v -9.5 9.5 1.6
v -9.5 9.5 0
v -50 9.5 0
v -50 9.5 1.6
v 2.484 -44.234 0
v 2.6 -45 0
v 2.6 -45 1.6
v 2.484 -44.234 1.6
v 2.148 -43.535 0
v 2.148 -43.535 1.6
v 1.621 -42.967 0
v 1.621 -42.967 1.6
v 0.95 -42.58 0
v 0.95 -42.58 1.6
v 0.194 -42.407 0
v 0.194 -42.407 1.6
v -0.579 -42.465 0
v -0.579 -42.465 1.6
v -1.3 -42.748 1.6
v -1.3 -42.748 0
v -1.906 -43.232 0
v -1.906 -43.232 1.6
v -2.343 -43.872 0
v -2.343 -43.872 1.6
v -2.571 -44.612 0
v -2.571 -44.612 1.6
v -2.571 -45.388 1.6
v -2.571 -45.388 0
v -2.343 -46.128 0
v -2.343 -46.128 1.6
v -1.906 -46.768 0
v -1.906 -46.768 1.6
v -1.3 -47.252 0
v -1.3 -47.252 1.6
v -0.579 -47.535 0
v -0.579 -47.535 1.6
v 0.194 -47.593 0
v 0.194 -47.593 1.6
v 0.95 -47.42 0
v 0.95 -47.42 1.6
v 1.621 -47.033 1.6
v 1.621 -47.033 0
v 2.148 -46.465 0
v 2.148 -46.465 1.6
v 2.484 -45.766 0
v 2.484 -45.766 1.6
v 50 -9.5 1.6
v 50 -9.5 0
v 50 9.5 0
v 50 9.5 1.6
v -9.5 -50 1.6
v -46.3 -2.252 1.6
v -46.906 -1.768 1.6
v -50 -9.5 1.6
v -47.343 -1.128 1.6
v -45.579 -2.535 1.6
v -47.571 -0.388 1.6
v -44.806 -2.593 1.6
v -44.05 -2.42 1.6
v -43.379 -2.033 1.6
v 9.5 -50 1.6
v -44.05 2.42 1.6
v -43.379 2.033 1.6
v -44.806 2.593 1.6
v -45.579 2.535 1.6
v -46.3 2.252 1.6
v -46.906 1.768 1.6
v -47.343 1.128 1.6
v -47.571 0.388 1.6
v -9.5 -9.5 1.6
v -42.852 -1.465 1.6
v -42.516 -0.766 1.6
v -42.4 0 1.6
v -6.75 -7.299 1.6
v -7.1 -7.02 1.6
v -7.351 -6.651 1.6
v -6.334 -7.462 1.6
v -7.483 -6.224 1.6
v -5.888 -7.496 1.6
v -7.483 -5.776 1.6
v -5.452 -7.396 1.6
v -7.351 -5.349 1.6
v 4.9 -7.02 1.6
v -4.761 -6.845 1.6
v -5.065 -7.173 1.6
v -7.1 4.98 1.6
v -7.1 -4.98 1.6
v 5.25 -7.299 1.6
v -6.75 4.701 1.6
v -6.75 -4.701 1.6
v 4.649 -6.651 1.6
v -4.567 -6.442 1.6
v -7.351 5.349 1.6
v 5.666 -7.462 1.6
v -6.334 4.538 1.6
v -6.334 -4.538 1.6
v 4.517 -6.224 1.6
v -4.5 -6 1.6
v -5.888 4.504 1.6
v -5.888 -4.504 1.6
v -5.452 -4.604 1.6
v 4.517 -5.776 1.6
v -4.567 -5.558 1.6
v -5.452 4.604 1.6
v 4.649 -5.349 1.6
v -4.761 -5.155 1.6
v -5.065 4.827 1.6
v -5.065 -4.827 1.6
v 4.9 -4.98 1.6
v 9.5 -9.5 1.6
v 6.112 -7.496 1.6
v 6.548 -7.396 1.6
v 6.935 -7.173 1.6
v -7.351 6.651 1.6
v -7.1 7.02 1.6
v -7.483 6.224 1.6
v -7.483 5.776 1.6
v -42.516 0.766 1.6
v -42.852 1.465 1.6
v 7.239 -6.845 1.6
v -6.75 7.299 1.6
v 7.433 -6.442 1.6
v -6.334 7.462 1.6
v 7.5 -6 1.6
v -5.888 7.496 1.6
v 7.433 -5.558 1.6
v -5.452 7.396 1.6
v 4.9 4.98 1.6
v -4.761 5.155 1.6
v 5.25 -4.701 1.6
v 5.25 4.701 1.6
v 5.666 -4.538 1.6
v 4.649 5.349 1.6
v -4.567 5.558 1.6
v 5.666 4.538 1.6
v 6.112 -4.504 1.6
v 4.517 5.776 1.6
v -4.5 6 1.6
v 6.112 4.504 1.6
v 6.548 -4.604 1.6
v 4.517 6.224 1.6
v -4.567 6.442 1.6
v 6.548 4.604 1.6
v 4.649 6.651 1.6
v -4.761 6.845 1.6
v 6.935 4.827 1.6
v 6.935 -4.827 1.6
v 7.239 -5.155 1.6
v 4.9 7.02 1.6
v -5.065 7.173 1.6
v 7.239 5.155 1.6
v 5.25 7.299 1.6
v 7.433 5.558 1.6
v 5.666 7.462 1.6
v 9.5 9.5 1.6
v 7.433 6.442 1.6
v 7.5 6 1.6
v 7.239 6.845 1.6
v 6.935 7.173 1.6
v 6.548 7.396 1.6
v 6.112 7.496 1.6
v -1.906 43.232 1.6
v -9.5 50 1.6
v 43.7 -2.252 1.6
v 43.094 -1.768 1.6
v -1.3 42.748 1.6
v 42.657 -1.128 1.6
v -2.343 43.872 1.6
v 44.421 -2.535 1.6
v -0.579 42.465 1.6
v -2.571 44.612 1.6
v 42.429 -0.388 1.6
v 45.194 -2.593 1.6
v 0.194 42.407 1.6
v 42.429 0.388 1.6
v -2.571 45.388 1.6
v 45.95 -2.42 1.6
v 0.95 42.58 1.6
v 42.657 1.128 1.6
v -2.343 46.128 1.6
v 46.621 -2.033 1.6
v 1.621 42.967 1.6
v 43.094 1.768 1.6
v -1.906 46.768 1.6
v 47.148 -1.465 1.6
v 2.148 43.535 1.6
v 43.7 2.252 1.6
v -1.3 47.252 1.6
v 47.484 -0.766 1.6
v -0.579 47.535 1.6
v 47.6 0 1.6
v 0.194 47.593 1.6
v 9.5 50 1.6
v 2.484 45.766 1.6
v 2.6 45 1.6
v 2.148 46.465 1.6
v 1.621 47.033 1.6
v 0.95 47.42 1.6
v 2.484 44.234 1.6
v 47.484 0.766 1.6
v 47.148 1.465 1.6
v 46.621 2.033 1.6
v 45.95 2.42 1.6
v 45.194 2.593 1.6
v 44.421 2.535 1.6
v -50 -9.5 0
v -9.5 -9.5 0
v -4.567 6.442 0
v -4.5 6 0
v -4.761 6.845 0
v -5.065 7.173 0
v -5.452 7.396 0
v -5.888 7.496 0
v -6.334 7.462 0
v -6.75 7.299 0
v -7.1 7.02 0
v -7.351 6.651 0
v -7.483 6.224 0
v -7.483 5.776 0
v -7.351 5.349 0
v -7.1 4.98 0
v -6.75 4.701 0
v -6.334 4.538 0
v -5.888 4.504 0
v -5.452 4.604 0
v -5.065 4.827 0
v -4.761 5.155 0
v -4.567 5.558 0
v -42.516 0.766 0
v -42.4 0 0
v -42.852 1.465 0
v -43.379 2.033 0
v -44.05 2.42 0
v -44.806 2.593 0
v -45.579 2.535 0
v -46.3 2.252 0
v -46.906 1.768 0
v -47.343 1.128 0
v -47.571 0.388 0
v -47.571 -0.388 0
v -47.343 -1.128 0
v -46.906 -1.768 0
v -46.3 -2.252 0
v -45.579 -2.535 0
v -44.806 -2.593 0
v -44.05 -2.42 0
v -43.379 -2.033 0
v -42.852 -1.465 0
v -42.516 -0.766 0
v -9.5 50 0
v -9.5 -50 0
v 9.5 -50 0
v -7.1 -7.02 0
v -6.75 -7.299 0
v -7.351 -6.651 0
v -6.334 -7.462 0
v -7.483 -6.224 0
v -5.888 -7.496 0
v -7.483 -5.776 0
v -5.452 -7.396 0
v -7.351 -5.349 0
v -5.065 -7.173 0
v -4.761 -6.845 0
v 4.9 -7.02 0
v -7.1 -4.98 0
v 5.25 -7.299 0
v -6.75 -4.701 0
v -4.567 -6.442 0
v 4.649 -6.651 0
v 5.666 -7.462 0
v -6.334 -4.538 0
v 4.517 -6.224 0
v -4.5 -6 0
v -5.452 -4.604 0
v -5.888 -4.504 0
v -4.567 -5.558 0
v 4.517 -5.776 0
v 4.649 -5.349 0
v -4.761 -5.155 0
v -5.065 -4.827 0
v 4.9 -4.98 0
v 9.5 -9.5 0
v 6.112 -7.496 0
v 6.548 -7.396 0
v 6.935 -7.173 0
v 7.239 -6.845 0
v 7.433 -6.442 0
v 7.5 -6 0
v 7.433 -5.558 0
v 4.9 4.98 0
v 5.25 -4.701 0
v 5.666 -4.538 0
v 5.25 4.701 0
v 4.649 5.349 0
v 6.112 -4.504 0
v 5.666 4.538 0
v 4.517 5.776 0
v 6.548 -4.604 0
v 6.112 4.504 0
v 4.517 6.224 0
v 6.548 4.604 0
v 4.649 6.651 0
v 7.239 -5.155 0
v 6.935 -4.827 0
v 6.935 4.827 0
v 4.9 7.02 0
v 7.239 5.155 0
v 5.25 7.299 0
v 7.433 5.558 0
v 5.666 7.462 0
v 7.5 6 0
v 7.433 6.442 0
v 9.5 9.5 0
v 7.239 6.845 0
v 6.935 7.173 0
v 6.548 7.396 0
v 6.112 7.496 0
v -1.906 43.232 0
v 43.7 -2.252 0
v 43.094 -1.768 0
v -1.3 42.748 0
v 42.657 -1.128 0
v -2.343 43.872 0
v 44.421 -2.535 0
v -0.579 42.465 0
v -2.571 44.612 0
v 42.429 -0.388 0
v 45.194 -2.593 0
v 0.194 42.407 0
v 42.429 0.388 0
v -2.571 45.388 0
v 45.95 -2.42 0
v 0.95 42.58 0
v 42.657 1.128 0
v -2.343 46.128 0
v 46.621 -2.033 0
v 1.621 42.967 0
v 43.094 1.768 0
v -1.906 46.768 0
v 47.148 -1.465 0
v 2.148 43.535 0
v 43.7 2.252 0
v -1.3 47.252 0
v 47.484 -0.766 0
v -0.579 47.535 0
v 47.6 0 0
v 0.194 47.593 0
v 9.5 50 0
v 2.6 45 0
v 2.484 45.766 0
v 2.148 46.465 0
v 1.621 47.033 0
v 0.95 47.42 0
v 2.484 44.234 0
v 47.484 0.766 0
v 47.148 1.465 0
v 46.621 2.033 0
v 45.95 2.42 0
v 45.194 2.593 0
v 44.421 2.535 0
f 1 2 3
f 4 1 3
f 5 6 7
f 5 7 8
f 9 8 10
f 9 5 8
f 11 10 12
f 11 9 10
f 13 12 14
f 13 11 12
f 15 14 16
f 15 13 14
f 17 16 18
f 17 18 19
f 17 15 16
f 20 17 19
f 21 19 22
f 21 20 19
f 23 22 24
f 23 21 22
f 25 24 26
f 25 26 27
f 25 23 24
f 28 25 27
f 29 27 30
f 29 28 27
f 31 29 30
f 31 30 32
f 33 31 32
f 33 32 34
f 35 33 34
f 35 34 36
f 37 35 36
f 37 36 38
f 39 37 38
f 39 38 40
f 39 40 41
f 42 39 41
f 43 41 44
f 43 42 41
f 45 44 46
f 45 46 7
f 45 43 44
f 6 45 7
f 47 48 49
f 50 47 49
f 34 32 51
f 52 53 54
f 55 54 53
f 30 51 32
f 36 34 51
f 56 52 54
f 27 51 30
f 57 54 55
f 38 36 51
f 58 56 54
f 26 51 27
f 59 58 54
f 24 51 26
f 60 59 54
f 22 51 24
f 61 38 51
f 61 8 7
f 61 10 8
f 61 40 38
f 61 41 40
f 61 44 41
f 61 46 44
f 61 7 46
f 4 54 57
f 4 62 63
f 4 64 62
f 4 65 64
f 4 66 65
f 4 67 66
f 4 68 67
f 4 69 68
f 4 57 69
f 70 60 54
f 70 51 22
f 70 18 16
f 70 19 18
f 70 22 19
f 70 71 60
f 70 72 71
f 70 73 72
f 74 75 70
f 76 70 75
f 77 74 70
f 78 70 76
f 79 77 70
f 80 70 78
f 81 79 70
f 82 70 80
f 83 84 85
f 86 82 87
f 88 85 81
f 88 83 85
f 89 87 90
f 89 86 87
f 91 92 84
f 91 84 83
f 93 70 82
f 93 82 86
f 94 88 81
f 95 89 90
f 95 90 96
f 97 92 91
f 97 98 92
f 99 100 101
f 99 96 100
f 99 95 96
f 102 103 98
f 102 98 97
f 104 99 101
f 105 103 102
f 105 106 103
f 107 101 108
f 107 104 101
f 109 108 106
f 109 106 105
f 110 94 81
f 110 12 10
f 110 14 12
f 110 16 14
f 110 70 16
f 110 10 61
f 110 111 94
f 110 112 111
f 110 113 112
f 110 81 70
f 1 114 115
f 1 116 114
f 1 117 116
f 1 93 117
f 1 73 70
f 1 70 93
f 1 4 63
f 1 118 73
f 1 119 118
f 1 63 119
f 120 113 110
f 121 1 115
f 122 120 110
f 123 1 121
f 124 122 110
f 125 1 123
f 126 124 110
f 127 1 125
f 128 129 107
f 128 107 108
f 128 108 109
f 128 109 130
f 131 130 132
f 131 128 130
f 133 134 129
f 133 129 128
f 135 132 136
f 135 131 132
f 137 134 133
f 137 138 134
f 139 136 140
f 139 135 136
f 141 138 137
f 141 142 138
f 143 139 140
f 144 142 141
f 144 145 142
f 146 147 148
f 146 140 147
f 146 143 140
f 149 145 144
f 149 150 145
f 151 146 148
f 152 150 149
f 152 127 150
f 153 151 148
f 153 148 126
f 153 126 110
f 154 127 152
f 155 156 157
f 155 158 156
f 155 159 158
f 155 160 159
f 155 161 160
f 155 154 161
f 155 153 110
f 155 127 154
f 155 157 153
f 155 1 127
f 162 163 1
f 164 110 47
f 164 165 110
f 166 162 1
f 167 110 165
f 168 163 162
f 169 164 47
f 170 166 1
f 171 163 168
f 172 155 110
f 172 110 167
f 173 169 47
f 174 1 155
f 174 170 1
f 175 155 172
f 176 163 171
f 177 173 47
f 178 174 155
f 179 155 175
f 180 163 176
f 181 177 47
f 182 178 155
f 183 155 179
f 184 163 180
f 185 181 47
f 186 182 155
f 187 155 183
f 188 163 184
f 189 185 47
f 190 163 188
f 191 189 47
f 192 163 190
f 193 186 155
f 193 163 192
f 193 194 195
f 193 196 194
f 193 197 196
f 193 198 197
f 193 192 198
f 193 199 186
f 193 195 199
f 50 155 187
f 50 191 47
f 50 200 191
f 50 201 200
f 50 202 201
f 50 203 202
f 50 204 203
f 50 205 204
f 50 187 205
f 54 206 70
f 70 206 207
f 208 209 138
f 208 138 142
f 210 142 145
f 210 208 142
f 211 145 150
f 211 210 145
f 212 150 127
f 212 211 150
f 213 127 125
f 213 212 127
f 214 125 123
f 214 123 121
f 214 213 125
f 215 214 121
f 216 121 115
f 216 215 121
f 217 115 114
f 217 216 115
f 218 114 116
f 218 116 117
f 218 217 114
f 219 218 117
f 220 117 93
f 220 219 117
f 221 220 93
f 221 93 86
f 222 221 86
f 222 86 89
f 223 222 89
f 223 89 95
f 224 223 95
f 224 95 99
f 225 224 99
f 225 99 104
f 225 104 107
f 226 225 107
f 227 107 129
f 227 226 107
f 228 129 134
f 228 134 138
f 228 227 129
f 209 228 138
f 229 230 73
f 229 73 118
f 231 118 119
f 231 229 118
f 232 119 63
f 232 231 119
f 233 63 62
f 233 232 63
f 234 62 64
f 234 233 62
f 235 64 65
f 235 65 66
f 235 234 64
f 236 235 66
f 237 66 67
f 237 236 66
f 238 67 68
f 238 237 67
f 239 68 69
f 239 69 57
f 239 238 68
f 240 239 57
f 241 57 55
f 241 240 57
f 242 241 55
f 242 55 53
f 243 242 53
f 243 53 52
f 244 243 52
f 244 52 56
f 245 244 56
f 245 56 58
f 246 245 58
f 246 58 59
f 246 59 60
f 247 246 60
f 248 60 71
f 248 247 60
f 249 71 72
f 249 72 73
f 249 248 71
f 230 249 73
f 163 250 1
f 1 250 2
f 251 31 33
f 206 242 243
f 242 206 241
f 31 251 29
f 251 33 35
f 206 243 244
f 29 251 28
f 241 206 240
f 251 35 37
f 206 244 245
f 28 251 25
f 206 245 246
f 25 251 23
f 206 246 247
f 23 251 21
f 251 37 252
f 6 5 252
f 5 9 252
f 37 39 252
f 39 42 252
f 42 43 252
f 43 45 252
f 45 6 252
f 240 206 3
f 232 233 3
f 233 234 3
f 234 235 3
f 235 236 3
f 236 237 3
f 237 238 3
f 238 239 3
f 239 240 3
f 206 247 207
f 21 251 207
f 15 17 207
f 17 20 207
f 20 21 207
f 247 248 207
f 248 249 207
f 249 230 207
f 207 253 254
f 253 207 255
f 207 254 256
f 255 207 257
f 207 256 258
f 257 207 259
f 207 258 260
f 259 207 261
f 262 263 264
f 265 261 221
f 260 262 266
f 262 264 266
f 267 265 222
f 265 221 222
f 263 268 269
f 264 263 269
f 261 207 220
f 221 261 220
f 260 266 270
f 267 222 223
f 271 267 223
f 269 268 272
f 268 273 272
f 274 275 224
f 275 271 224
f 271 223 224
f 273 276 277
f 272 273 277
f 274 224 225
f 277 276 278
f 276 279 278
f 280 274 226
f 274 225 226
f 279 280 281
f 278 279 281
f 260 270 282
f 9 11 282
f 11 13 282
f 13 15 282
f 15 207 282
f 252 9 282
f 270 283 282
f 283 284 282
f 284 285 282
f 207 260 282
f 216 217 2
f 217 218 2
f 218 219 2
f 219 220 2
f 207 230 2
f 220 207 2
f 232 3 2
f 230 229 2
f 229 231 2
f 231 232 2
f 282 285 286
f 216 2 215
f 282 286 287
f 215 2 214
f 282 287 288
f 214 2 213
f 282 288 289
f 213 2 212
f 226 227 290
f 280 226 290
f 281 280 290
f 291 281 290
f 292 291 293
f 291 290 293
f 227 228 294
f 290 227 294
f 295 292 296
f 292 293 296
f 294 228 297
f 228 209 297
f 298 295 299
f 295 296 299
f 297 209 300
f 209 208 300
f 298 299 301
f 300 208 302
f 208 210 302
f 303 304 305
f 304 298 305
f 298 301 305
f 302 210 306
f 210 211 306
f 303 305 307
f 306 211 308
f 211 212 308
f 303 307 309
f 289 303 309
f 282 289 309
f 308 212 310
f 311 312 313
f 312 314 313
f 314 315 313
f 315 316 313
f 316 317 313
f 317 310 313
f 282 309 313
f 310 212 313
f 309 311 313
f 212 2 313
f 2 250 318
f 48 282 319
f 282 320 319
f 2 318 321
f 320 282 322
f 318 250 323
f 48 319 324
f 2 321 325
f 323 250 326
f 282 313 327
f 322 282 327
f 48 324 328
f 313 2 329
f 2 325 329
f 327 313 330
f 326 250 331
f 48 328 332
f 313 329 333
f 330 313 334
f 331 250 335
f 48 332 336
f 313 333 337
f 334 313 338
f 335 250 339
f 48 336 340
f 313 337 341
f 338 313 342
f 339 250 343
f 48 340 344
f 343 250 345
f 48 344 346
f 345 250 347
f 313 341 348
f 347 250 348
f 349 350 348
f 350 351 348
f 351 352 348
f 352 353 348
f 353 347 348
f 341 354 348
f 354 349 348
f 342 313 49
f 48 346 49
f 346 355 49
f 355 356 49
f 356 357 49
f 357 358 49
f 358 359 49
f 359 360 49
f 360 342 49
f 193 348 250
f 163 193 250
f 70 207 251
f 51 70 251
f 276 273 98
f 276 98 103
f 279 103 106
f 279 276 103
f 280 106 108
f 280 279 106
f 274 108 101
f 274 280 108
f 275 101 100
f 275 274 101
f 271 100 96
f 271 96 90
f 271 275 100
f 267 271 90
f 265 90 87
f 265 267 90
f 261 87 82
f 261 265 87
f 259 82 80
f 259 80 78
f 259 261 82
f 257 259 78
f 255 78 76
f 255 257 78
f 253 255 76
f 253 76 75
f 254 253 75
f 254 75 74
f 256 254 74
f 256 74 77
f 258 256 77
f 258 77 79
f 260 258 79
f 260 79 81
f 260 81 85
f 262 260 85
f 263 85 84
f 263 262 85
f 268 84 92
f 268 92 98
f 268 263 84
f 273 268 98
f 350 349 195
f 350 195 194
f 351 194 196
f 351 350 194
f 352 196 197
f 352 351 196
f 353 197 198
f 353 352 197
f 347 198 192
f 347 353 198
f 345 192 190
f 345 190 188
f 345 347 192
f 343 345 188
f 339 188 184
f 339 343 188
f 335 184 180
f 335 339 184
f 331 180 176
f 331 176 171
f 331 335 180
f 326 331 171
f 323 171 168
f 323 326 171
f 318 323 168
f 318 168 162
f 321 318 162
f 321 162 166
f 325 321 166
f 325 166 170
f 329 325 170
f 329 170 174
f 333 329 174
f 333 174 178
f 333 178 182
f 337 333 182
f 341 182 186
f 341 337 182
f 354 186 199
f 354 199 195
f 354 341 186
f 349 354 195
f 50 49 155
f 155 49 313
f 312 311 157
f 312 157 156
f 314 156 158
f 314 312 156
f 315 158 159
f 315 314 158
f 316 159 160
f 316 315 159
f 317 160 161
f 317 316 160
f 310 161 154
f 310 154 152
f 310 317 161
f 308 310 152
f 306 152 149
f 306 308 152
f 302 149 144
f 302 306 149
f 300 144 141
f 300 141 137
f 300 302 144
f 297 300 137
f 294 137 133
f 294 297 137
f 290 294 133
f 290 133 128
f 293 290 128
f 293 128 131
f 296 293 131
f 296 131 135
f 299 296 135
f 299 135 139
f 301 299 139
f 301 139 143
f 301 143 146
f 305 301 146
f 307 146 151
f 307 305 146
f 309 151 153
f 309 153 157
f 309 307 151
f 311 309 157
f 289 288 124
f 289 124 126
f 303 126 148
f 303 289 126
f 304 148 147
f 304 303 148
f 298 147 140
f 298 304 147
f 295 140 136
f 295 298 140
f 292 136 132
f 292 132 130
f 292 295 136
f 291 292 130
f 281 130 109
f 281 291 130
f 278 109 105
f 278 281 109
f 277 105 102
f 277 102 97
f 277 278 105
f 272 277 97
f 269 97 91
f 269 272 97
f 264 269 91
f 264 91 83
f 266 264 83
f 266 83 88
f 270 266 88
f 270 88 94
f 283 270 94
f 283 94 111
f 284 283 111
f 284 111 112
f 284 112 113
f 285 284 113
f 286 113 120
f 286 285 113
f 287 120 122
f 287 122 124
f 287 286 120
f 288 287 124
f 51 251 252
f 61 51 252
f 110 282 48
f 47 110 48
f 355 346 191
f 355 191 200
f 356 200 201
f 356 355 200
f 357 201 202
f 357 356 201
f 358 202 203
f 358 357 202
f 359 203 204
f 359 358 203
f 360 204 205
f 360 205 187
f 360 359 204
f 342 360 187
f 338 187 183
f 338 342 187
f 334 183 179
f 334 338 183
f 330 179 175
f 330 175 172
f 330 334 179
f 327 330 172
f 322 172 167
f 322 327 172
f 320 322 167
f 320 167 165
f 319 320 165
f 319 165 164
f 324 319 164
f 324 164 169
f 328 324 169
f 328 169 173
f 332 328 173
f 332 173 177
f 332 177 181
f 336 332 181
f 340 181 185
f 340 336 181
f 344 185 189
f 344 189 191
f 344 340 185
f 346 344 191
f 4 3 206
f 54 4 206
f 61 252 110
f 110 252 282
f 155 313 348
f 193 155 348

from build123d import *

# Parameters (mm, degrees)
F0_R     = 1.5
F0_R_2   = 2.6
F1_DEPTH = 1.6


with BuildPart() as f1:
    # F0 (on Top) → F1 (new body)
    with BuildSketch(Plane.XY):
        Polygon((9.5, 50), (-9.5, 50), (-9.5, 9.5), (-50, 9.5), (-50, -9.5), (-9.5, -9.5), (-9.5, -50), (9.5, -50), (9.5, -9.5), (50, -9.5), (50, 9.5), (9.5, 9.5), align=None)
        with Locations((-6, -6)):
            Circle(F0_R, mode=Mode.SUBTRACT)
        with Locations((0, -45)):
            Circle(F0_R_2, mode=Mode.SUBTRACT)
        with Locations((6, -6)):
            Circle(F0_R, mode=Mode.SUBTRACT)
        with Locations((-45, 0)):
            Circle(F0_R_2, mode=Mode.SUBTRACT)
        with Locations((-6, 6)):
            Circle(F0_R, mode=Mode.SUBTRACT)
        with Locations((6, 6)):
            Circle(F0_R, mode=Mode.SUBTRACT)
        with Locations((45, 0)):
            Circle(F0_R_2, mode=Mode.SUBTRACT)
        with Locations((0, 45)):
            Circle(F0_R_2, mode=Mode.SUBTRACT)
    extrude(amount=F1_DEPTH)


solid = f1.part
